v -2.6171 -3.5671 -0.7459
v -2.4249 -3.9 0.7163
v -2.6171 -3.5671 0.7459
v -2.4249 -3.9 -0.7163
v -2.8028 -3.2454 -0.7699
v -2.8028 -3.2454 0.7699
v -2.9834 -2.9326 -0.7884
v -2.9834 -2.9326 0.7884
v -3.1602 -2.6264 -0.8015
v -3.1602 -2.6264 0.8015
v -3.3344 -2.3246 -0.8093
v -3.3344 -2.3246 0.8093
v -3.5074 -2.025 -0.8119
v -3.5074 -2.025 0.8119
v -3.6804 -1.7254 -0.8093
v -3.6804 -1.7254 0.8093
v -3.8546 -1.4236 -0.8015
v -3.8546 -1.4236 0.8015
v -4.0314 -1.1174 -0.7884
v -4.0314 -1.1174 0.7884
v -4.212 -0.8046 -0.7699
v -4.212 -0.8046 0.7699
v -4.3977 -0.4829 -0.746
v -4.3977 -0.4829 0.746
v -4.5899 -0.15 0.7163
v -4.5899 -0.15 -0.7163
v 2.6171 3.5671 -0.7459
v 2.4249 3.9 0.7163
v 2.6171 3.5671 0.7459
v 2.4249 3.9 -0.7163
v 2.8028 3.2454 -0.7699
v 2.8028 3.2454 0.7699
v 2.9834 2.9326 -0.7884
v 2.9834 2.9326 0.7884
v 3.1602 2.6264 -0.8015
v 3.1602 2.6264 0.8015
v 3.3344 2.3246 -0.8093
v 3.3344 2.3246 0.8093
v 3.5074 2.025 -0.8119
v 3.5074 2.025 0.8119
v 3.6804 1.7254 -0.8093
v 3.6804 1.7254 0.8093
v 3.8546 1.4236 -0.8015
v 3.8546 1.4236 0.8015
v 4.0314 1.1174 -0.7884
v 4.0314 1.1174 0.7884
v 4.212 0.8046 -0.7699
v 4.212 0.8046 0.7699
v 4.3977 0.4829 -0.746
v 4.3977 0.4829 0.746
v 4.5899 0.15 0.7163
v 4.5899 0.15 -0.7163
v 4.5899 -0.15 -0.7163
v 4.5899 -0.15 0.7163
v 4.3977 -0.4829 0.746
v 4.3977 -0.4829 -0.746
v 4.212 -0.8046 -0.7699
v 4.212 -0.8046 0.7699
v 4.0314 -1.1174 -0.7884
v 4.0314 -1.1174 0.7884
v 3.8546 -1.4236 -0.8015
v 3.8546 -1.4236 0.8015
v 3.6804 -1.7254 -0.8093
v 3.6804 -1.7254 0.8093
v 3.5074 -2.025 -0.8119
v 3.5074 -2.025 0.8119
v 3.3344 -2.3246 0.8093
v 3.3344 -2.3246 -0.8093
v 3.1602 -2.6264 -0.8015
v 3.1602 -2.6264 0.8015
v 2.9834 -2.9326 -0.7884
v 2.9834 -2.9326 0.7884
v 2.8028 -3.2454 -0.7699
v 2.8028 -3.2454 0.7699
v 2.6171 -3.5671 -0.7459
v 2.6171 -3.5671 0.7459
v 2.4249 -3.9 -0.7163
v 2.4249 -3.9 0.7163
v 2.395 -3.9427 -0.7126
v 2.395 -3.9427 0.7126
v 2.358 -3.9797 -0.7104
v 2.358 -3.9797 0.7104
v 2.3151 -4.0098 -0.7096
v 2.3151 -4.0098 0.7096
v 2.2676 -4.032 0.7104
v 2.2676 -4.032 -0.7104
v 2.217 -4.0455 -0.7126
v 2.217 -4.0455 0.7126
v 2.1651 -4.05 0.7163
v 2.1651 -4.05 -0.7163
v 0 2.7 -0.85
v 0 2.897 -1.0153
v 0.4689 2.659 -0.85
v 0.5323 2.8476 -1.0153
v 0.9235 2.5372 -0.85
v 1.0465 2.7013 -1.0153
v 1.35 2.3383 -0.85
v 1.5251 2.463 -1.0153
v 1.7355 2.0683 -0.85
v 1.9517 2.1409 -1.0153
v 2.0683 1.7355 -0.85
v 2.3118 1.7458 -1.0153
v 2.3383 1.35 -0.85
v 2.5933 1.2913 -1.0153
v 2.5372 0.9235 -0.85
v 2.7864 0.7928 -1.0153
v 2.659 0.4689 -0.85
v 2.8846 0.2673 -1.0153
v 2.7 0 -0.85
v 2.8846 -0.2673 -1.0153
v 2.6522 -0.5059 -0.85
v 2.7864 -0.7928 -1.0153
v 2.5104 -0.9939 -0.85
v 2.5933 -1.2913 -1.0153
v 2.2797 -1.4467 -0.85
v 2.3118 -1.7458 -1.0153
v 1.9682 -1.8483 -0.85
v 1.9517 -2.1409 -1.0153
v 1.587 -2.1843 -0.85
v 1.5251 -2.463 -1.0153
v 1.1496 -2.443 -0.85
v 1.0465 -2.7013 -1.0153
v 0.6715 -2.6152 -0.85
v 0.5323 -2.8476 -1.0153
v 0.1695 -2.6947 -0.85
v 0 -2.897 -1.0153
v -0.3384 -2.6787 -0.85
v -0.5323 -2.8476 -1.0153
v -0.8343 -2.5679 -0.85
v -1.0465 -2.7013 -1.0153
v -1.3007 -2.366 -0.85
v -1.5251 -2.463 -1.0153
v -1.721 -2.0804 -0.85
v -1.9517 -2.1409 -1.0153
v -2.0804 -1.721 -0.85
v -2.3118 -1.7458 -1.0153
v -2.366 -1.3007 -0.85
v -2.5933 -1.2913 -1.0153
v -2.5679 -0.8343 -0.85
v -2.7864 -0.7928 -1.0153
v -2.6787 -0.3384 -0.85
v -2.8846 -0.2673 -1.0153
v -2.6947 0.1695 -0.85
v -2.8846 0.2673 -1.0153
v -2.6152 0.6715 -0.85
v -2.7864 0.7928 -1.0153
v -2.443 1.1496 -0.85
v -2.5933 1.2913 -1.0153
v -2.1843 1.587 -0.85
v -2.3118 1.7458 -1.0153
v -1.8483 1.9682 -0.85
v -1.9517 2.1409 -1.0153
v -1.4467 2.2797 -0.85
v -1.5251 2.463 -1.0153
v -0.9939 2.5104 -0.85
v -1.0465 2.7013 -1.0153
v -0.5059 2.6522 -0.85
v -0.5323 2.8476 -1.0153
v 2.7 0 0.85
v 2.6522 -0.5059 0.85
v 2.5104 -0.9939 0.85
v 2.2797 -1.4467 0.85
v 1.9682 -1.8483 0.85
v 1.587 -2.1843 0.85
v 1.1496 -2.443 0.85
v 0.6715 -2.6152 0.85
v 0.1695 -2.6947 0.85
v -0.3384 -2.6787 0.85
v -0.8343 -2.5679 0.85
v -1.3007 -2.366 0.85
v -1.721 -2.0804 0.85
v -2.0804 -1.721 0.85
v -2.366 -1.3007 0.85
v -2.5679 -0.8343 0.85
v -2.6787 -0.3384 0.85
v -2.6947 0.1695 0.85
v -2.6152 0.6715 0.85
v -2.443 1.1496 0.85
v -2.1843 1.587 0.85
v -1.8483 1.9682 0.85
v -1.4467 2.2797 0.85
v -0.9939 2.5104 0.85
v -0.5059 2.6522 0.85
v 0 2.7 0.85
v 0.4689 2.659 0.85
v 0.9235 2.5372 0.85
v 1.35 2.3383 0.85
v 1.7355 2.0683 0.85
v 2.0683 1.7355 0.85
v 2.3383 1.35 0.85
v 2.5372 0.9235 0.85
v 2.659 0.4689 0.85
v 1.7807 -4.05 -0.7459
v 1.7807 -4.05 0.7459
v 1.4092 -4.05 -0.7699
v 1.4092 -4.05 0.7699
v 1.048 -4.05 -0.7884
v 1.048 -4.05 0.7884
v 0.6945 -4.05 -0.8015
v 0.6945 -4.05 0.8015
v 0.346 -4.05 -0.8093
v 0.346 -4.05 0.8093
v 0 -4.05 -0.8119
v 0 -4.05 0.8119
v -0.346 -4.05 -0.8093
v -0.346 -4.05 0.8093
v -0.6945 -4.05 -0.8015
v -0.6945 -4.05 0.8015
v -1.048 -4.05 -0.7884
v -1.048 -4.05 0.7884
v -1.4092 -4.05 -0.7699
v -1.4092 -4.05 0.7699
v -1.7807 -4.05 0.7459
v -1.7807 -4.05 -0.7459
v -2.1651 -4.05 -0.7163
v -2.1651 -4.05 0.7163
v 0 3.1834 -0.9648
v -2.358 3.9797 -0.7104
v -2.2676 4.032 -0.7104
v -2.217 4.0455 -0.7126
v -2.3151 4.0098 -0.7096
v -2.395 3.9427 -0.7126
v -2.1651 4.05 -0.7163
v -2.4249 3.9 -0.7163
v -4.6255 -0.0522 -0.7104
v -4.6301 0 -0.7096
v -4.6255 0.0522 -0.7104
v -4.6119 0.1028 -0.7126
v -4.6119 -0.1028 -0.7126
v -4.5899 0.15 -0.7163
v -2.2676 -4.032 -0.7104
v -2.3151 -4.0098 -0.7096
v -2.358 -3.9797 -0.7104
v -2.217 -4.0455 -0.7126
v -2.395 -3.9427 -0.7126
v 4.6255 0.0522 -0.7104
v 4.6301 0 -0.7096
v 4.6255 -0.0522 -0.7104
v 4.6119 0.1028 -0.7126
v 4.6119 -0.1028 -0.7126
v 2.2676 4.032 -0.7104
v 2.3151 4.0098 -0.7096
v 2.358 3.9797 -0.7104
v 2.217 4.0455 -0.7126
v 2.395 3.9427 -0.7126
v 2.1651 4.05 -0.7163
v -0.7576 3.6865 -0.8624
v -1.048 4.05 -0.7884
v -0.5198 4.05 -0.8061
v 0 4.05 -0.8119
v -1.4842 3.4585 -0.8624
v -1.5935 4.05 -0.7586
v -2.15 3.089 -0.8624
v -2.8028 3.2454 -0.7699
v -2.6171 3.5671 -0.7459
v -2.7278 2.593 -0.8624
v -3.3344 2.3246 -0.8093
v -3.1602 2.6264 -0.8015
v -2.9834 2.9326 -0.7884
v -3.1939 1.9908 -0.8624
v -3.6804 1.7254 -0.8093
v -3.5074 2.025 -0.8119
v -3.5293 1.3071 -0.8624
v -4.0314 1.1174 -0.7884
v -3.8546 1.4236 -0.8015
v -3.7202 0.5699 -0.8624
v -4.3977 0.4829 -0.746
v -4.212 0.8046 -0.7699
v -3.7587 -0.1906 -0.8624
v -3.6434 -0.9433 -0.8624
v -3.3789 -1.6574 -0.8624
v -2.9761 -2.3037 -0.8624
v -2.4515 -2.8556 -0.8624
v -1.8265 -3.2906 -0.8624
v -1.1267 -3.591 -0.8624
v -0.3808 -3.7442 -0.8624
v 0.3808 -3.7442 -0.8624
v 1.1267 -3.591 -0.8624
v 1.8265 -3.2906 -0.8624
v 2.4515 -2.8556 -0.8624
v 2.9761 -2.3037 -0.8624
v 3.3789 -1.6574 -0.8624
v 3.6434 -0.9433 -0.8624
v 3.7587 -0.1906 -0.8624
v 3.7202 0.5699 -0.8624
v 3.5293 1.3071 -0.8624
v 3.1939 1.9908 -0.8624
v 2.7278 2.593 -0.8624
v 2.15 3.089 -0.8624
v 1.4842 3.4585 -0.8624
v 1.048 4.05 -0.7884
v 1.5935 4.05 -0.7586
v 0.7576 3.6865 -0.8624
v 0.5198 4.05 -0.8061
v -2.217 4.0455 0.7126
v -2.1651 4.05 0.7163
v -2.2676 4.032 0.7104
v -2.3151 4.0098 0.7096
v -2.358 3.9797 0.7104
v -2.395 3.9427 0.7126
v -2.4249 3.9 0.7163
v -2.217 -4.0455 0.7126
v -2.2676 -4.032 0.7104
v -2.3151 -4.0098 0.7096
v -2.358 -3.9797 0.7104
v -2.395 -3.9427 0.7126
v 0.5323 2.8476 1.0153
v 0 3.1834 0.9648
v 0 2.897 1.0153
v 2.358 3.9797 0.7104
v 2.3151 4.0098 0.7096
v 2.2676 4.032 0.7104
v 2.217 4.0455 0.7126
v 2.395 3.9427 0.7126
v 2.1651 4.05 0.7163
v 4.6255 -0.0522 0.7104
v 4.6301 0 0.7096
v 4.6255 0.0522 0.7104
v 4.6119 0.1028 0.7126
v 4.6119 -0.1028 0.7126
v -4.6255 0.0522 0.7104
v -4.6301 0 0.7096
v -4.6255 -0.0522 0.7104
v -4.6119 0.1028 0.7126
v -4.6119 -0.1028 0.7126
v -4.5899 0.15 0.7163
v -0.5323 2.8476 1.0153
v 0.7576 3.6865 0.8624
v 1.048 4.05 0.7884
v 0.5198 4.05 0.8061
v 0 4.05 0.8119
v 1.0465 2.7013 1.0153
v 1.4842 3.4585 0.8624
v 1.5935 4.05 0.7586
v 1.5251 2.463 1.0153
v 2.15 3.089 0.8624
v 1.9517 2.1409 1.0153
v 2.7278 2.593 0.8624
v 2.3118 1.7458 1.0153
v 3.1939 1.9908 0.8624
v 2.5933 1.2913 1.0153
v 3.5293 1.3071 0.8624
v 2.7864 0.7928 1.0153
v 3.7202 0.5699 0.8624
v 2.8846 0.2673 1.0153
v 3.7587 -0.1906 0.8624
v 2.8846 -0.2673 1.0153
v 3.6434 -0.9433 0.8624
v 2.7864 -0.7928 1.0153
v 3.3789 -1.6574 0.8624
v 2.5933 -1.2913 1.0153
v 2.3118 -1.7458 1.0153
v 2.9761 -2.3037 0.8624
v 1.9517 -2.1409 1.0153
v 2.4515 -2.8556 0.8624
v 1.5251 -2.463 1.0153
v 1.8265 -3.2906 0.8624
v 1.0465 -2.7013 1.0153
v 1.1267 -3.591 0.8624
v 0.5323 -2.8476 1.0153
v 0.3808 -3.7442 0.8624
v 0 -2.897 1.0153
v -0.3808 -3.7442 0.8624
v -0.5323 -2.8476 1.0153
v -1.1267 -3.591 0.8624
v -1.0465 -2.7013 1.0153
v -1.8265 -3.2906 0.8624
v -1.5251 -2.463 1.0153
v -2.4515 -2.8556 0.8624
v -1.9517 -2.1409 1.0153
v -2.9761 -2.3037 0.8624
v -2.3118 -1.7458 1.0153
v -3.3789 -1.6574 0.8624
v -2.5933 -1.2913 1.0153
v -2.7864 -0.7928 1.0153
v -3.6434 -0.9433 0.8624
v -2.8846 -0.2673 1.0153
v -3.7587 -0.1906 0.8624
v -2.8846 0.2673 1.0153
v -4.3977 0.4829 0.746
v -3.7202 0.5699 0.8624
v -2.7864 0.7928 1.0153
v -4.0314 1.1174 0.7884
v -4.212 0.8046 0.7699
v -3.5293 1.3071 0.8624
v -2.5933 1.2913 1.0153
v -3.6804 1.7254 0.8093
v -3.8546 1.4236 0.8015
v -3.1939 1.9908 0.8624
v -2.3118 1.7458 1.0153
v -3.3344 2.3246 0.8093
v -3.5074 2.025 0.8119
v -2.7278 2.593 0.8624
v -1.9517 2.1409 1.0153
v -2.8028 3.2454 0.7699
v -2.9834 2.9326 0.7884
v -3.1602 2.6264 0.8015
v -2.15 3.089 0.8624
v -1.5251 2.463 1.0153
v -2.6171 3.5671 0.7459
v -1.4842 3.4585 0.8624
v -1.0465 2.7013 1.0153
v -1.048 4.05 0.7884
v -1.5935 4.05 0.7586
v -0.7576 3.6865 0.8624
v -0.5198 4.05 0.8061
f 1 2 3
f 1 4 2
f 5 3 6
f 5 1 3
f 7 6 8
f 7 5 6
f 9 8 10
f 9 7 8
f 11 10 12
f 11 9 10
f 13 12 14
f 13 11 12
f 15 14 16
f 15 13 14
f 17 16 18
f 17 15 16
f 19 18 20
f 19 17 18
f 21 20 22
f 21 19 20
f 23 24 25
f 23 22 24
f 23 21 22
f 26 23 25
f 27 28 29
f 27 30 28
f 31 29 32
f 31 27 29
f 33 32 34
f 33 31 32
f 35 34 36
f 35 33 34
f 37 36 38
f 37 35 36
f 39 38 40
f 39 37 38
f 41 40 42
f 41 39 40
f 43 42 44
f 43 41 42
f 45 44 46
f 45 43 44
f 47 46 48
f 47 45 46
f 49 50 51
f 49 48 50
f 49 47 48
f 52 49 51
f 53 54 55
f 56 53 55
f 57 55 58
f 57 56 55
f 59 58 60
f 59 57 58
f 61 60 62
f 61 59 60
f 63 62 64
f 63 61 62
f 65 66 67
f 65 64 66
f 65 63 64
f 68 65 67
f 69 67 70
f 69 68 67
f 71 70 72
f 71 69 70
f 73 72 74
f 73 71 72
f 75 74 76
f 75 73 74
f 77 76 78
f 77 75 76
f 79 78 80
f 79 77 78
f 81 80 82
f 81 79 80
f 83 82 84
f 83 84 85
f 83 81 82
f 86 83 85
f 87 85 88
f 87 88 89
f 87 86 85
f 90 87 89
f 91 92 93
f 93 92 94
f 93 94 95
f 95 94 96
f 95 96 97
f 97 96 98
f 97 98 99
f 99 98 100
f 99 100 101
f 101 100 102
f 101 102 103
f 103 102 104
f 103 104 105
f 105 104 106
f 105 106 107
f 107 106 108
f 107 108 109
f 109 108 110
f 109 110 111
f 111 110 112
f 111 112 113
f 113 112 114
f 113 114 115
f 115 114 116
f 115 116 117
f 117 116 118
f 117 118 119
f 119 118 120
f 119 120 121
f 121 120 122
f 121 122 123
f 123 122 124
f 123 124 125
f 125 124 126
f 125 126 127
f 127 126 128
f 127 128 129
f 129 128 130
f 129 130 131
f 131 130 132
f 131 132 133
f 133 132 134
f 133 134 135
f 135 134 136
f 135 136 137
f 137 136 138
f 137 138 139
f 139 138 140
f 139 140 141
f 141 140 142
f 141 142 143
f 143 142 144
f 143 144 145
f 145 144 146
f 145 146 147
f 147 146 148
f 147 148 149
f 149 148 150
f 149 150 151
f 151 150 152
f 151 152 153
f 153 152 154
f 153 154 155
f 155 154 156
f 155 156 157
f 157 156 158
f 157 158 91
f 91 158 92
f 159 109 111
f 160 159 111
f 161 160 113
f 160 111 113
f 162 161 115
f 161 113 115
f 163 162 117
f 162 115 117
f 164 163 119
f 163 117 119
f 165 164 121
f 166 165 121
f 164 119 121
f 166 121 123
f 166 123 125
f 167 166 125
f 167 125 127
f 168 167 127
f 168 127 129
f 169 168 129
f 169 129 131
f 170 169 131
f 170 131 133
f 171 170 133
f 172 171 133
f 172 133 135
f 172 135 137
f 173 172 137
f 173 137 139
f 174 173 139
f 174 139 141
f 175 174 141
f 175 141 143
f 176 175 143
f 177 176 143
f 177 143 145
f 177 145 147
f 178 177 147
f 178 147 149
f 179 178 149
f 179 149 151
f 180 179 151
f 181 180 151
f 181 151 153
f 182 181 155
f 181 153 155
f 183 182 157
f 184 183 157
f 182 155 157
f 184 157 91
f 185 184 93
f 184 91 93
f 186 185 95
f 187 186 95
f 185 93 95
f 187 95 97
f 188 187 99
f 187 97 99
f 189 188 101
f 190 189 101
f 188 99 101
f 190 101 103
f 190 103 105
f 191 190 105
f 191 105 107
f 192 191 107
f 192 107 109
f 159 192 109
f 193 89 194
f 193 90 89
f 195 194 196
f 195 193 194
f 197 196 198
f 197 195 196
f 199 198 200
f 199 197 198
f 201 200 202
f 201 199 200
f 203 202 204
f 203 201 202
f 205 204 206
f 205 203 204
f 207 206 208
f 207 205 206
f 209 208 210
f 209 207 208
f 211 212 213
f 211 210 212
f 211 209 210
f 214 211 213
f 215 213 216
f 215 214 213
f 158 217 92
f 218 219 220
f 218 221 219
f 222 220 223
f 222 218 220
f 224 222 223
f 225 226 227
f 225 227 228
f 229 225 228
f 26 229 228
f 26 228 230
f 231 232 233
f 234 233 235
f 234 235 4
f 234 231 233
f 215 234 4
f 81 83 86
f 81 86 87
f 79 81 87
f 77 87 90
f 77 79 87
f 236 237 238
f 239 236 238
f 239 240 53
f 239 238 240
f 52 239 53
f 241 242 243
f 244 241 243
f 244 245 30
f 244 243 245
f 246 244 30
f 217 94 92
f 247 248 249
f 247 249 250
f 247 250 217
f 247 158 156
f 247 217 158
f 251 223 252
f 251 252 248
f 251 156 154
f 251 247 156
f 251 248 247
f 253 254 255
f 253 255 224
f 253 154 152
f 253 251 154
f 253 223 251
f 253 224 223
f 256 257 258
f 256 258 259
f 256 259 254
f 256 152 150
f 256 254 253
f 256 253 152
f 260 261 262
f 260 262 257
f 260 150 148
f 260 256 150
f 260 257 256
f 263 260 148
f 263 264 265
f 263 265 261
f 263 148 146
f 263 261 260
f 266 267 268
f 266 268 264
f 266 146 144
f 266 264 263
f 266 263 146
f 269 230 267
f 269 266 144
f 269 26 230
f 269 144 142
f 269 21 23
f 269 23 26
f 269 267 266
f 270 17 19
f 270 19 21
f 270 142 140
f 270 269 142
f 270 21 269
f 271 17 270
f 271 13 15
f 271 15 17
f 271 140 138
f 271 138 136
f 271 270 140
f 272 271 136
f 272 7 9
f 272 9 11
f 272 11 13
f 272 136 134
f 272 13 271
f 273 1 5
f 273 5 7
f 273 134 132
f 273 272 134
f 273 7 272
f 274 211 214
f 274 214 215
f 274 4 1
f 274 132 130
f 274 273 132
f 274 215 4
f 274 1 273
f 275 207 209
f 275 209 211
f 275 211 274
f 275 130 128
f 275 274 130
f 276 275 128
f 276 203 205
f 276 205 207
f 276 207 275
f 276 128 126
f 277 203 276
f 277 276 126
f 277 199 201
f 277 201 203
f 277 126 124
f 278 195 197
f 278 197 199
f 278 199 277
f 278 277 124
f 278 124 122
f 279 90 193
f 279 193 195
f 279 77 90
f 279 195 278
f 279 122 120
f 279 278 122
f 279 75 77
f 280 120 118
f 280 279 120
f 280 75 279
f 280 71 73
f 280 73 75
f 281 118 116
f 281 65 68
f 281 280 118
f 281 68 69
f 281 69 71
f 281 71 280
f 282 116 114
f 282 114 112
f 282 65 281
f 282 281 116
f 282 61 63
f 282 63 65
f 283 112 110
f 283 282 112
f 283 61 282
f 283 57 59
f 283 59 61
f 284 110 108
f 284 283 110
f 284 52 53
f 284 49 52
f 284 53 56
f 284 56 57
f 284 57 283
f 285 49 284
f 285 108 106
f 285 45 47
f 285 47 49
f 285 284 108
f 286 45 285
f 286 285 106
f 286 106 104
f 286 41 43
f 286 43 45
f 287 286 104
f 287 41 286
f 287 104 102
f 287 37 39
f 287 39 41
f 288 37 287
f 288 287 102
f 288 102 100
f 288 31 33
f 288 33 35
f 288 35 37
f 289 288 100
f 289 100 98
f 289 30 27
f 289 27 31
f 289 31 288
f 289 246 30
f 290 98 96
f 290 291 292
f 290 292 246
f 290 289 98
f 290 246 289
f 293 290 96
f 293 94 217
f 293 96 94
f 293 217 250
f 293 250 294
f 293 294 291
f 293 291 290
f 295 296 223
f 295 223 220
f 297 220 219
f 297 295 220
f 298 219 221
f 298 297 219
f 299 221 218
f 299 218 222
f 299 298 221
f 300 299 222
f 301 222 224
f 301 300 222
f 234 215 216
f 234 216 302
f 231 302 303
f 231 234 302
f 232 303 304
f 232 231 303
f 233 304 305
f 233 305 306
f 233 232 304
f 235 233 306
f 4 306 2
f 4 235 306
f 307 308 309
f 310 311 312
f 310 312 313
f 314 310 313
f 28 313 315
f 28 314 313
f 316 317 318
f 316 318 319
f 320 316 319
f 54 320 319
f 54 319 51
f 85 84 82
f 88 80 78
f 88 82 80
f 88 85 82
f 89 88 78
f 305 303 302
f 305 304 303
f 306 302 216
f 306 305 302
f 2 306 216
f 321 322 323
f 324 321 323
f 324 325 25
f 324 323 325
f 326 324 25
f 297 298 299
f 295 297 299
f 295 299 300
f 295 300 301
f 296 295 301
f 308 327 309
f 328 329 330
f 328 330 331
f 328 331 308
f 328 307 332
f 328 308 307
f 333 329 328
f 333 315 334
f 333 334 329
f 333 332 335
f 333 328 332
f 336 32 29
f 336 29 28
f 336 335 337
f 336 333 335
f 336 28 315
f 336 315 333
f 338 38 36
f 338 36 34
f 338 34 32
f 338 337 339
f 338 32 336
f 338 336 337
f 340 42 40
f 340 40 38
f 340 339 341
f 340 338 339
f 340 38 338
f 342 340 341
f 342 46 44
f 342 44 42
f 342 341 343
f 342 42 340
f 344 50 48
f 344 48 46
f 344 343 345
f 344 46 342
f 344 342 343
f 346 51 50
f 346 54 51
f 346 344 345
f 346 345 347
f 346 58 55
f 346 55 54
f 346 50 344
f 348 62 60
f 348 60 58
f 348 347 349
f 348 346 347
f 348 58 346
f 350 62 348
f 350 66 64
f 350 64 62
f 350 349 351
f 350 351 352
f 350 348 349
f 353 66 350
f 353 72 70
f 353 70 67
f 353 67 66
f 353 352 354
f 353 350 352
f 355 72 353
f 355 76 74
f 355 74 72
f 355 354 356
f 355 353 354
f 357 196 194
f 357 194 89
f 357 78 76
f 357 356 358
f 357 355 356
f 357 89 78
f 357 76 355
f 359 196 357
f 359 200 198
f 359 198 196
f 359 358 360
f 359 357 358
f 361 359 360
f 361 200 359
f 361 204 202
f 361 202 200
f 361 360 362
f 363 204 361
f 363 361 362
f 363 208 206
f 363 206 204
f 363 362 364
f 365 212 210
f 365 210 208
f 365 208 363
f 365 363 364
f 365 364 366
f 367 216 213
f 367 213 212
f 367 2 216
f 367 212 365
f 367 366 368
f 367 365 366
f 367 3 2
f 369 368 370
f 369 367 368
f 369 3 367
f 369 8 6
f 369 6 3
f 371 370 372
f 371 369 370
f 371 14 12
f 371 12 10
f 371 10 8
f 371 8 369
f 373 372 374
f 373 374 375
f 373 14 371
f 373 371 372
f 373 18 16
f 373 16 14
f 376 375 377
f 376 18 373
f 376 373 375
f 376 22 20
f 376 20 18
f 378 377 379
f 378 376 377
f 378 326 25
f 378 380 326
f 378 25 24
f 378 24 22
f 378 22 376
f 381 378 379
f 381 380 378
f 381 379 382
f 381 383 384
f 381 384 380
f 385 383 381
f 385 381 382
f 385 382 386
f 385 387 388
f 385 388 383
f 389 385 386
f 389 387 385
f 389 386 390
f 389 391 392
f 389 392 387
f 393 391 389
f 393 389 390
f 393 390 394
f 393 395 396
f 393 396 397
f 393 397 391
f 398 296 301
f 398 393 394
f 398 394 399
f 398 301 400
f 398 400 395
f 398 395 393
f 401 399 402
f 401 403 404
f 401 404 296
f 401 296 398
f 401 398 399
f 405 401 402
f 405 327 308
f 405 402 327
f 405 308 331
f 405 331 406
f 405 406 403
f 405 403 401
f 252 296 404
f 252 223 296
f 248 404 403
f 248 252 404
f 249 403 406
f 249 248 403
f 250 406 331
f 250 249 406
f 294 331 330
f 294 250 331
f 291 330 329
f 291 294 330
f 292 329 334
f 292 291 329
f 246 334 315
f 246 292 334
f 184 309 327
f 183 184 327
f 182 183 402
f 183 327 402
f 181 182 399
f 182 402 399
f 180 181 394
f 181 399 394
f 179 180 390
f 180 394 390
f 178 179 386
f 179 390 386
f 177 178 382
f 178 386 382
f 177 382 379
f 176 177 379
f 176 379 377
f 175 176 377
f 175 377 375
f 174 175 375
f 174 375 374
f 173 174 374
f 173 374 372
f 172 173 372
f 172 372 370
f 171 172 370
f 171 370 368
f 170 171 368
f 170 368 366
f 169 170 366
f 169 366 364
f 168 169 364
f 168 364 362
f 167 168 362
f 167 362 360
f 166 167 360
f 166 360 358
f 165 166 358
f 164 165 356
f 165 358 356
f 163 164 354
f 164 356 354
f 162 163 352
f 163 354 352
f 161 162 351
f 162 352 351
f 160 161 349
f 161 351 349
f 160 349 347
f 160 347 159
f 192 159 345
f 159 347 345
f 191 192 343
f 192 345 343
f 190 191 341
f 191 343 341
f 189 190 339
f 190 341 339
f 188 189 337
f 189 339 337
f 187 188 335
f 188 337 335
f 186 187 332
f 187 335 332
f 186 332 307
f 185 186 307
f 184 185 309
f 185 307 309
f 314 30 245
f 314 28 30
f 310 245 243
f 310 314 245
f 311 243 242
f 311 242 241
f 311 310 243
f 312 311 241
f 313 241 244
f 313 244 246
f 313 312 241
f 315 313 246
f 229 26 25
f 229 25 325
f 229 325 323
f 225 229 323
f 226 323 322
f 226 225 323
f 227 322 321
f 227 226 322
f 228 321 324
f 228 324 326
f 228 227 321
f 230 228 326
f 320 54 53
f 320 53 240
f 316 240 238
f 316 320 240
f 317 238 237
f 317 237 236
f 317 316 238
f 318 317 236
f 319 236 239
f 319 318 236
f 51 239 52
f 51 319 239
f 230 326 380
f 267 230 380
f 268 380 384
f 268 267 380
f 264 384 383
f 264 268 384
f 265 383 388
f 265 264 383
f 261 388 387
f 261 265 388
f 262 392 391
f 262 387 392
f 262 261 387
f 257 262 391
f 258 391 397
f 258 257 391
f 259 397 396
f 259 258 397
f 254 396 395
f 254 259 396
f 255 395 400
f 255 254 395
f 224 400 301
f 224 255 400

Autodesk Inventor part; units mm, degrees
ref_plane "YZ Plane" through (0, 0, 0) normal (1, 0, 0) x (0, 1, 0)
ref_plane "XZ Plane" through (0, 0, 0) normal (0, 1, 0) x (-1, 0, 0)
ref_plane "XY Plane" through (0, 0, 0) normal (0, 0, 1) x (1, 0, 0)
sketch "Sketch1" plane through (0, 0, 0) normal (0, 0, 1) x (1, 0, 0)
  line L0 (4.6765, 0) -> (2.3383, -4.05)
  line L1 (2.3383, -4.05) -> (-2.3383, -4.05)
  line L2 (-2.3383, -4.05) -> (-4.6765, 0)
  line L3 (-4.6765, 0) -> (-2.3383, 4.05)
  line L4 (-2.3383, 4.05) -> (2.3383, 4.05)
  line L5 (2.3383, 4.05) -> (4.6765, 0)
  point P0 (0, 0)
  point P1 (0, 0)
  dimension "d0" = 8.1
extrude "Extrusion1" add sketch "Sketch1" along normal mid plane 2.1
sketch "Sketch2" plane through (0, 0, -1.05) normal (0, 0, -1) x (1, 0, 0)
  circle A0 centre (0, 0) radius 2.7
  dimension "d3" = 5.4
extrude "Extrusion2" cut sketch "Sketch2" against normal blind 2.1
fillet "Fillet2" radius 0.3 6 edges at (-2.3383, 4.05, 0) (2.3383, 4.05, 0) (-4.6765, 0, 0) (-2.3383, -4.05, 0) (2.3383, -4.05, 0) (4.6765, 0, 0)
sketch "Sketch4" plane through (0, 0, 0) normal (1, 0, 0) x (0, 1, 0)
  line L0 (2.7, 1.05) -> (5, 1.05)
  line L1 (5, 1.05) -> (5, 0.6444)
  line L2 (5, 0.6444) -> (2.7, 1.05)
  line L3 (-2.7, 1.05) -> (2.7, 1.05) projected
  line L4 (0, 6.5189) -> (0, -6.6611) construction
  line L5 (0, -9.297) -> (0, 9.1548) projected
  point P0 (0, 0)
  point P1 (5, 0.8472)
  dimension "d26" = 5
  dimension "d27" = 10
revolve "Revolution2" cut sketch "Sketch4" angle 360 about axis through (0, 0, 6.5189) along (0, 0, -1)
mirror "Mirror2" about plane through (0, 0, 0) normal (0, 0, 1) of "Revolution2"
chamfer "Chamfer4" distance 0.2 angle 45 4 edges at (-1.9092, -1.9092, 1.05) (1.9092, 1.9092, 1.05) (-1.9092, -1.9092, -1.05) (1.9092, 1.9092, -1.05)
properties part number "ecrou"
